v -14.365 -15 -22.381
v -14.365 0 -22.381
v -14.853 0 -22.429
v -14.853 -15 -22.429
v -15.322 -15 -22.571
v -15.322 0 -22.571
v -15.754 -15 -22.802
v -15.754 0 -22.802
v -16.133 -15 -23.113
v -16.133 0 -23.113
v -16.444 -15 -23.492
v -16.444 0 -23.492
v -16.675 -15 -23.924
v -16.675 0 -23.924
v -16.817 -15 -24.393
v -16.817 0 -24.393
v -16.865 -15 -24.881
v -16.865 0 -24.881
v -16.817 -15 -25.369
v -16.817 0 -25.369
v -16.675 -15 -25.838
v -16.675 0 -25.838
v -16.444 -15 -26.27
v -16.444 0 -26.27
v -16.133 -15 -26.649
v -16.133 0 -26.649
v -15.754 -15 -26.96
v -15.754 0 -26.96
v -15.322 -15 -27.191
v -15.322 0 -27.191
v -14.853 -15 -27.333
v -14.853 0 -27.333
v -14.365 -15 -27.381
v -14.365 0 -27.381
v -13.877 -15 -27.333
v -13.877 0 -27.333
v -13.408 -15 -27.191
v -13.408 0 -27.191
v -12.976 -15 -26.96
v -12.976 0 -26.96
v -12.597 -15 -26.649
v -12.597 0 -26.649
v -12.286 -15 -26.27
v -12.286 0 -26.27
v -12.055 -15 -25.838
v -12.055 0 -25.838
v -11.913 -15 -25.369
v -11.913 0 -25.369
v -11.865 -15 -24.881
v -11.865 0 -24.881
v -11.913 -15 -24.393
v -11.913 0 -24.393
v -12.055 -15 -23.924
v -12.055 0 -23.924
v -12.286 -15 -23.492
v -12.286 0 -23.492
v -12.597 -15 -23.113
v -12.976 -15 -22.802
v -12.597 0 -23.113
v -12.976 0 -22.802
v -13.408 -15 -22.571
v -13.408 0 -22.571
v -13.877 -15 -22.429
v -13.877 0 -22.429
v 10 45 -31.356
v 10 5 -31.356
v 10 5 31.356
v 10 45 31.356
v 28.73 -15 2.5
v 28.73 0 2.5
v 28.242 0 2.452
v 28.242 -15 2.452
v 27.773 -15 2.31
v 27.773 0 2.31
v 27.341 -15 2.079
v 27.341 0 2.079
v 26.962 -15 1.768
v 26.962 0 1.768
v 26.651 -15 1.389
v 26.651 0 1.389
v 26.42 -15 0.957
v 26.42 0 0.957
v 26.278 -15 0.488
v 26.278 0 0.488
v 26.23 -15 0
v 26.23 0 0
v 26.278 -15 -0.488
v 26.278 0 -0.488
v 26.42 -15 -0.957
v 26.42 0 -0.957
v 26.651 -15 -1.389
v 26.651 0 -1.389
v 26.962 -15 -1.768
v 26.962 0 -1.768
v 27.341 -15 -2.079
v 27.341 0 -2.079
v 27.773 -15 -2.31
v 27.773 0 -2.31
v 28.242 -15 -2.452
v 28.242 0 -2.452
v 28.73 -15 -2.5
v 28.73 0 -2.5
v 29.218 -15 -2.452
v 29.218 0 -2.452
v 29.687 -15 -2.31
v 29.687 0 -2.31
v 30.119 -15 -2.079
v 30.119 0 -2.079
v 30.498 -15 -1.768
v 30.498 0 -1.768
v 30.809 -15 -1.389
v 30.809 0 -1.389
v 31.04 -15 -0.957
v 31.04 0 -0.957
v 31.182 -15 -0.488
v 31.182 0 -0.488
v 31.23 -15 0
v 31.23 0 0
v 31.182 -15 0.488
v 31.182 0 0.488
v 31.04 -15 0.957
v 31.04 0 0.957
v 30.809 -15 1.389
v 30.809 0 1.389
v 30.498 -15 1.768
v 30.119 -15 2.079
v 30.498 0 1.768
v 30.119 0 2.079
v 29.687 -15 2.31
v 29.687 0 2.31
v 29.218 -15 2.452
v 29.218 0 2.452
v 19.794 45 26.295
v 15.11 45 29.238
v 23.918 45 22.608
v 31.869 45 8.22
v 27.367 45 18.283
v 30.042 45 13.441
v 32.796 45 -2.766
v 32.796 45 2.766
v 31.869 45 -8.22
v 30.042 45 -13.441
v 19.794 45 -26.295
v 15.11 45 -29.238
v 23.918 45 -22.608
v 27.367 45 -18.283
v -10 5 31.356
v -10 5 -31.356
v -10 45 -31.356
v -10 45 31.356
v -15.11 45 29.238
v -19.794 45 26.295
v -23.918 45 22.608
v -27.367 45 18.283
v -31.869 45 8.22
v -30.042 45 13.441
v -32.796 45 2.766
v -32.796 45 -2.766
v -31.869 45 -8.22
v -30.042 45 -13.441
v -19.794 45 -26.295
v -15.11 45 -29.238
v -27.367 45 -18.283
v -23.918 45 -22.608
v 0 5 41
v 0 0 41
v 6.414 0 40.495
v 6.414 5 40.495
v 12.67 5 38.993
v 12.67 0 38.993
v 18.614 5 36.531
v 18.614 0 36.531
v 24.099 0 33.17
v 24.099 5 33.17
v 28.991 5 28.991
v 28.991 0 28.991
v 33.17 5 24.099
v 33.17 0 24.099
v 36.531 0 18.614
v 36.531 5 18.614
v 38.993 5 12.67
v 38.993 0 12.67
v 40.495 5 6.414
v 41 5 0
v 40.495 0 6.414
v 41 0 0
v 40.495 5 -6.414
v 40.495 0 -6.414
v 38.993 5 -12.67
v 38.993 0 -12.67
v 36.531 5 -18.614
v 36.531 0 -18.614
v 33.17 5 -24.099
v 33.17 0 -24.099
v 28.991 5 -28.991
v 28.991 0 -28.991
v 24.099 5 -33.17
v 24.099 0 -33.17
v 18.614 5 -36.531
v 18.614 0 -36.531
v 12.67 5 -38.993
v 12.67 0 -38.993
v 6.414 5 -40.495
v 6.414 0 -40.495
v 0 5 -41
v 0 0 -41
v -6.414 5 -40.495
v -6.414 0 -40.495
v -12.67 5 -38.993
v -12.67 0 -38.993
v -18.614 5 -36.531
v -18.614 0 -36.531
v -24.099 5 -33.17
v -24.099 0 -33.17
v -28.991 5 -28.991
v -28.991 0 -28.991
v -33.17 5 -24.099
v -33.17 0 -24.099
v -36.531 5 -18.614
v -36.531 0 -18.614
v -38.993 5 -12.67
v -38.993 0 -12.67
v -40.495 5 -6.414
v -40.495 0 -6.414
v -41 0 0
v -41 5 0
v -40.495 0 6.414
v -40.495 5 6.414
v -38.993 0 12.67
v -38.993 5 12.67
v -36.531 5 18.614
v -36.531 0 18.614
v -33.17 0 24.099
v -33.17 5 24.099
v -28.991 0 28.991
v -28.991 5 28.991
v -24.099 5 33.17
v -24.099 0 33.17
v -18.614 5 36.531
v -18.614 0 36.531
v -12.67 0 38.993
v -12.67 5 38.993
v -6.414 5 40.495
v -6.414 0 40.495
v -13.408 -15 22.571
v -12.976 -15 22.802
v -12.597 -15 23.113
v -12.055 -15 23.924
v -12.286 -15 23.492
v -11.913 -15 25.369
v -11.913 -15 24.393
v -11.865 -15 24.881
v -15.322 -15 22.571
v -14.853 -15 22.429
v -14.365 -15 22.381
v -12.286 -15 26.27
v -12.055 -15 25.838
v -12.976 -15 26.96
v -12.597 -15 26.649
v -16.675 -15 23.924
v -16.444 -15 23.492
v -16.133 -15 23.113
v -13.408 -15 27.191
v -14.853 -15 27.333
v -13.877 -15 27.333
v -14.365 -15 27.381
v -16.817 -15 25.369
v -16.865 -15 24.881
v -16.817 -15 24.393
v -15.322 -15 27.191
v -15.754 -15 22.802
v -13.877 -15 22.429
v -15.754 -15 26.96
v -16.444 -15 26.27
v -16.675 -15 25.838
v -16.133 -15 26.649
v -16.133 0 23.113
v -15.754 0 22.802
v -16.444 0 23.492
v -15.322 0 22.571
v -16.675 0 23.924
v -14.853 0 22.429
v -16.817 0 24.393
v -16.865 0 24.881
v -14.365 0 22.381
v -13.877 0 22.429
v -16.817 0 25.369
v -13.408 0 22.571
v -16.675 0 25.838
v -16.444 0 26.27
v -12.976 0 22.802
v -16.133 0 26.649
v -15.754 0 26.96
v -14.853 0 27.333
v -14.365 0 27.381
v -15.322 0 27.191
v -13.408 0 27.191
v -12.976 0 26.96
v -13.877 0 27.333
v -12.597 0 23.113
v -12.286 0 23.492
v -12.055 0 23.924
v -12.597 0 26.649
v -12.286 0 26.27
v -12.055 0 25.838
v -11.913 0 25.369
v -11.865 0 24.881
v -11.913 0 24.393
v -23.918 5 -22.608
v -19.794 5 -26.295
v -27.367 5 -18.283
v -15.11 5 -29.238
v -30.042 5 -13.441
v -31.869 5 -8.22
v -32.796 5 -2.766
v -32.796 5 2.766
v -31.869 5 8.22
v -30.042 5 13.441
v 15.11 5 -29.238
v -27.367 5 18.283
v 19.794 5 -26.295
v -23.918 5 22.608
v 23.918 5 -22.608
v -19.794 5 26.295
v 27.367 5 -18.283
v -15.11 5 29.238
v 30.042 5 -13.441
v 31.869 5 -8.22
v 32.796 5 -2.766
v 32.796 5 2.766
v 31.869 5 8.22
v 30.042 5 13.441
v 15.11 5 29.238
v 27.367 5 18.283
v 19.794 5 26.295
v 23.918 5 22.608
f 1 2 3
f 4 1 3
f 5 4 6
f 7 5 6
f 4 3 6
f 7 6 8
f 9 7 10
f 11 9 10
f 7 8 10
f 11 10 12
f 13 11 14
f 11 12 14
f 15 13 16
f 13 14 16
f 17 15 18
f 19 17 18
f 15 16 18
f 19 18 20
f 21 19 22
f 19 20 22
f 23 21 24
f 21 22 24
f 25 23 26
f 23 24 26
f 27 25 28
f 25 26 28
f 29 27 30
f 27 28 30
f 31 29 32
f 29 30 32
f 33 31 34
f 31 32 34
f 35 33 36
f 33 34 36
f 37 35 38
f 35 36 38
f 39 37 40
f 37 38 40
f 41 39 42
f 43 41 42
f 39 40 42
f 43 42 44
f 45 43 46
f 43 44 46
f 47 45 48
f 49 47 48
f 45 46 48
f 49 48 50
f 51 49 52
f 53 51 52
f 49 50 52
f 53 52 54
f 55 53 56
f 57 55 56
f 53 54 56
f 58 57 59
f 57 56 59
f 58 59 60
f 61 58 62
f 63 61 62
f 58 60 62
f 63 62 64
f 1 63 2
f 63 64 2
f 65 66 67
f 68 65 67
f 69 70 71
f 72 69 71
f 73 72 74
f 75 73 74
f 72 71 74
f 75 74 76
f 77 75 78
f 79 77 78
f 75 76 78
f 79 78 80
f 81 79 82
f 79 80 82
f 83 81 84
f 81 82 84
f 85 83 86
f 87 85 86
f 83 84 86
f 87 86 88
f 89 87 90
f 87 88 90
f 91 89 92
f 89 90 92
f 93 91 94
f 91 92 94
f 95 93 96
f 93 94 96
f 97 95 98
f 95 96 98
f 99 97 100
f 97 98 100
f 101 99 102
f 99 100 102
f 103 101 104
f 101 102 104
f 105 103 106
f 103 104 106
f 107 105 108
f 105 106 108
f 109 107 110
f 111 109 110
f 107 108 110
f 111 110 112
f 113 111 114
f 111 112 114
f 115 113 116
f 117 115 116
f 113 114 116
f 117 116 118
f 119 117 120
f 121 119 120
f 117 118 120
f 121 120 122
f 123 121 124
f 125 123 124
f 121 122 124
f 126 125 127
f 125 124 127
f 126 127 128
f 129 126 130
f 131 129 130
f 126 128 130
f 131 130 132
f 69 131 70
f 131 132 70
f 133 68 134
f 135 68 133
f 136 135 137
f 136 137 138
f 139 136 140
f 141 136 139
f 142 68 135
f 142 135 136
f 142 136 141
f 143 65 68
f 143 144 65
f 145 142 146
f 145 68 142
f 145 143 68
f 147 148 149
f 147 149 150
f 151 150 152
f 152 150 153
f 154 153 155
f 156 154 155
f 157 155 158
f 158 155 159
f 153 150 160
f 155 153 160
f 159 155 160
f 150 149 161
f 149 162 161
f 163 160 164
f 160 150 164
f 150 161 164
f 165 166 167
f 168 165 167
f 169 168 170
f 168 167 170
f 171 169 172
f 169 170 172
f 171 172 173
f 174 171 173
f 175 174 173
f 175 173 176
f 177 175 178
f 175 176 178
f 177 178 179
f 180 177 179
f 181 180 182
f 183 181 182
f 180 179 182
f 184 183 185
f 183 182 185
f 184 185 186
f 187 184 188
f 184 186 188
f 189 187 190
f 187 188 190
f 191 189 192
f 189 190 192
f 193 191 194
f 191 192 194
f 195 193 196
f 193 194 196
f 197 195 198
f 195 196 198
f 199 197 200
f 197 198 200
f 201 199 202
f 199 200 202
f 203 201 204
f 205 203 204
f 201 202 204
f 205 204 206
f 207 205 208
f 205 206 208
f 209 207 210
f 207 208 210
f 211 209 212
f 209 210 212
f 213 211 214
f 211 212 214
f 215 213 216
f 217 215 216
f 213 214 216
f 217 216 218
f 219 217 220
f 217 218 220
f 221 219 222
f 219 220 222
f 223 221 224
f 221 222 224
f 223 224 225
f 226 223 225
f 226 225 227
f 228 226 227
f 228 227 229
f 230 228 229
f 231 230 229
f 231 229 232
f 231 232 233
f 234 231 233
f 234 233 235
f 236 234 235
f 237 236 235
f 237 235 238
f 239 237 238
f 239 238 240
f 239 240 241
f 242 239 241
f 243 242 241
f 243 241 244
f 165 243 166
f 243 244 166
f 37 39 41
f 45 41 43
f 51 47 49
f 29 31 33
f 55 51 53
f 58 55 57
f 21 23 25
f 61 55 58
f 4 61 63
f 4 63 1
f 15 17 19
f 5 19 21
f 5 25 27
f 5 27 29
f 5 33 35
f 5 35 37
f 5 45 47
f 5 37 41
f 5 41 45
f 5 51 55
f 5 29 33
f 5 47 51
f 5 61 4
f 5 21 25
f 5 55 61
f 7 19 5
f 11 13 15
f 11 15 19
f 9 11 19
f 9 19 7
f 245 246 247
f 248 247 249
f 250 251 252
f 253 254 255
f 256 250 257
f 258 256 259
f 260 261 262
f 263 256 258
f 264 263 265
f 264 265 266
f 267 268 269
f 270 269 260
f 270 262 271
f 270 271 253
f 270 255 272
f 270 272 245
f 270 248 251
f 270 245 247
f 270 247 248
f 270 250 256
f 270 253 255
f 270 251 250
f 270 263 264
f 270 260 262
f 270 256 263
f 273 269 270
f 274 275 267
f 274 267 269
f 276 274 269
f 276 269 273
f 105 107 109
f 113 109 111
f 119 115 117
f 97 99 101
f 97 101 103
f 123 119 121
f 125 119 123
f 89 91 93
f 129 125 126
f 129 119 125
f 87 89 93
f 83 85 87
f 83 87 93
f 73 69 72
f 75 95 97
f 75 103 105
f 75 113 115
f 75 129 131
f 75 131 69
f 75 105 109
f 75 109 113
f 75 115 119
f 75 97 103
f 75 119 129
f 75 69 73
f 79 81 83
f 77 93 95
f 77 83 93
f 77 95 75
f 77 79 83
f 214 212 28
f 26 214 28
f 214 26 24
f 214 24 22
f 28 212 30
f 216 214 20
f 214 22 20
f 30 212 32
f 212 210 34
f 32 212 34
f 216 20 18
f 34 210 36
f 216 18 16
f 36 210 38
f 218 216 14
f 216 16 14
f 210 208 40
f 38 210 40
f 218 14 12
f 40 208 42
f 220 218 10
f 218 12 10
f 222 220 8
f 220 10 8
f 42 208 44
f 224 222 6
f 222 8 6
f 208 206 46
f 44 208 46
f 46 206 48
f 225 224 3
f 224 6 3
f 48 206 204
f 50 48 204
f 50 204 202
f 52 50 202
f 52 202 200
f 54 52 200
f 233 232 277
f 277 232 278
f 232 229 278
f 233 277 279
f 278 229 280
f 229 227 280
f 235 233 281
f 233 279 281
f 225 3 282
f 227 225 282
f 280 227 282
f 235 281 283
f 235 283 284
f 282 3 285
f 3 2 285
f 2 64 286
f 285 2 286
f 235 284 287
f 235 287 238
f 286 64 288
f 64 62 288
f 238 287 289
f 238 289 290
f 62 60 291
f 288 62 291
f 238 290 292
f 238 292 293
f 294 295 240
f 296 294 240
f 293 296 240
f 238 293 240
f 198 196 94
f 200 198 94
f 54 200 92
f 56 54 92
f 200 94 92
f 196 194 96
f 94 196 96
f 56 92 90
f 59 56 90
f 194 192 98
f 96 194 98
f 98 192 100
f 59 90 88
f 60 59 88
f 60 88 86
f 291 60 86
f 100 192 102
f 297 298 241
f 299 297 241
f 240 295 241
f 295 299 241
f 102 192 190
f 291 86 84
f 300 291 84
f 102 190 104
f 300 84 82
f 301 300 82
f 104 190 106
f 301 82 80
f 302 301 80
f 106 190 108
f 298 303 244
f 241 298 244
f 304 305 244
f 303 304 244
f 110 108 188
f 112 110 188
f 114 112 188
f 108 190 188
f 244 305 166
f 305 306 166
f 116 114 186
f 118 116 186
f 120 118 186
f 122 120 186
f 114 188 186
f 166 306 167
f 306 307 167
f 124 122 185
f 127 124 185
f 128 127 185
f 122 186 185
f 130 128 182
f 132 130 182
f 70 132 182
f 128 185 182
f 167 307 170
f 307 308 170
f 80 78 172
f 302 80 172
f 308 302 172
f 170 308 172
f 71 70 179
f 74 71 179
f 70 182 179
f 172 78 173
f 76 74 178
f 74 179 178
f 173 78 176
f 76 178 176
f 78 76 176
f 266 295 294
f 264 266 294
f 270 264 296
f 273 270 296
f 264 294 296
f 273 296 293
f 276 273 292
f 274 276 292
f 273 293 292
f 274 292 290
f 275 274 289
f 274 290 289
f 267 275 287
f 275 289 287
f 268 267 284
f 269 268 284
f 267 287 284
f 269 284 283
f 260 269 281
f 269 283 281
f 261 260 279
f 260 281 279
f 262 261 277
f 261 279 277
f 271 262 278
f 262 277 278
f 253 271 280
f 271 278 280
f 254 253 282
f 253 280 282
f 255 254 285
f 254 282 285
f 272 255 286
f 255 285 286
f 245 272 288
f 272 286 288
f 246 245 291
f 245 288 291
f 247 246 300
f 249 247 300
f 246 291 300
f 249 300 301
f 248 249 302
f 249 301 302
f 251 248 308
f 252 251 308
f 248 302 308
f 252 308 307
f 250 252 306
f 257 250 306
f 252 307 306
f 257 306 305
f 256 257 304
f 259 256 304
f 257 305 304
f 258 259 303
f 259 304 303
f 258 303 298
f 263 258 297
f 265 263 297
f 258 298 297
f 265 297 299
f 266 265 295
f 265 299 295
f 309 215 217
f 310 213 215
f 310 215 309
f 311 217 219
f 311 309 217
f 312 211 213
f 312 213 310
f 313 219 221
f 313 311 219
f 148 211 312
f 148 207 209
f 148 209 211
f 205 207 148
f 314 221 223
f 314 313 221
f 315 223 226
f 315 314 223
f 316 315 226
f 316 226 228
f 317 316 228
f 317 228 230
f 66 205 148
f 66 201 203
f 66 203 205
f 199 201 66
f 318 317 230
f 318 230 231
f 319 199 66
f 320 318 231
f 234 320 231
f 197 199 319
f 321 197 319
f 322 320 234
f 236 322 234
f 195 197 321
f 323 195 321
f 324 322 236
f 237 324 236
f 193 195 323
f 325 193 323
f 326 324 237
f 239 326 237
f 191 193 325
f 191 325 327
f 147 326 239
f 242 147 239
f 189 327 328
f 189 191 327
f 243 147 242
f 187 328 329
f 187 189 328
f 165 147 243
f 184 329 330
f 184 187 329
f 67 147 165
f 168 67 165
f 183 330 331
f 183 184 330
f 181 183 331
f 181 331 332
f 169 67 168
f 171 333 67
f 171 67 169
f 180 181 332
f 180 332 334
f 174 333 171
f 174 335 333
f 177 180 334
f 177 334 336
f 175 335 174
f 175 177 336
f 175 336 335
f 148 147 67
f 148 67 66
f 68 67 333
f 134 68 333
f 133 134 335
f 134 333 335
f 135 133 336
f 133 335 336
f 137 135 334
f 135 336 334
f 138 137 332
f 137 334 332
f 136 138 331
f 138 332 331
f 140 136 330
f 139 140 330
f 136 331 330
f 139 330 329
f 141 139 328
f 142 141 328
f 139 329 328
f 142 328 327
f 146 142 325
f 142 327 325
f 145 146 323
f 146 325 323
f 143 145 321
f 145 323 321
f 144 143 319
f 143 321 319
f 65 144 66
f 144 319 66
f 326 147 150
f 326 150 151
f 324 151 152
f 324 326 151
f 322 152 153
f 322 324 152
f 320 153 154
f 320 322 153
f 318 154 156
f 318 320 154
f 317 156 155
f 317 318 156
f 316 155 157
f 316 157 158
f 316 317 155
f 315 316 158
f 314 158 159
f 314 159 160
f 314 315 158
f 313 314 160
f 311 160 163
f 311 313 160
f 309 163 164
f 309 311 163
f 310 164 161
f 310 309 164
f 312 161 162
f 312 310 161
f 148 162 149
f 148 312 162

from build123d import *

# Parameters (mm, degrees)
SKETCH1_R           = 41
BOSS_EXTRUDE1_DEPTH = 5
SKETCH2_R           = 2.5
BOSS_EXTRUDE2_DEPTH = 15
BOSS_EXTRUDE3_DEPTH = 40


with BuildPart() as part:
    # Sketch1 → Boss-Extrude1 (new body)
    with BuildSketch(Plane(origin=(0, 0, 0), x_dir=(1, 0, 0), z_dir=(0, 1, 0))):
        with Locations(Location((0, 0, 0), (0, 0, 270))):
            Circle(SKETCH1_R)
    extrude(amount=BOSS_EXTRUDE1_DEPTH)

    # Sketch2 → Boss-Extrude2 (add)
    with BuildSketch(Plane.XZ):
        with Locations(Location((28.730078072, 0, 0), (0, 0, 90))):
            Circle(SKETCH2_R)
        with Locations(Location((-14.365, 24.881, 0), (0, 0, 90))):
            Circle(SKETCH2_R)
        with Locations(Location((-14.365, -24.881, 0), (0, 0, 90))):
            Circle(SKETCH2_R)
    extrude(amount=BOSS_EXTRUDE2_DEPTH)

    # Sketch3 → Boss-Extrude3 (add)
    with BuildSketch(Plane(origin=(0, 5, 0), x_dir=(1, 0, 0), z_dir=(0, 1, 0))):
        with BuildLine():
            Line((-10, 31.356159261), (-10, -31.356159261))
            ThreePointArc((-10, -31.356159261), (-32.912136418, 0), (-10, 31.356159261))
        make_face()
        with BuildLine():
            Line((10, 31.356159261), (10, -31.356159261))
            ThreePointArc((10, -31.356159261), (32.912136418, 0), (10, 31.356159261))
        make_face()
    extrude(amount=BOSS_EXTRUDE3_DEPTH)


solid = part.part
